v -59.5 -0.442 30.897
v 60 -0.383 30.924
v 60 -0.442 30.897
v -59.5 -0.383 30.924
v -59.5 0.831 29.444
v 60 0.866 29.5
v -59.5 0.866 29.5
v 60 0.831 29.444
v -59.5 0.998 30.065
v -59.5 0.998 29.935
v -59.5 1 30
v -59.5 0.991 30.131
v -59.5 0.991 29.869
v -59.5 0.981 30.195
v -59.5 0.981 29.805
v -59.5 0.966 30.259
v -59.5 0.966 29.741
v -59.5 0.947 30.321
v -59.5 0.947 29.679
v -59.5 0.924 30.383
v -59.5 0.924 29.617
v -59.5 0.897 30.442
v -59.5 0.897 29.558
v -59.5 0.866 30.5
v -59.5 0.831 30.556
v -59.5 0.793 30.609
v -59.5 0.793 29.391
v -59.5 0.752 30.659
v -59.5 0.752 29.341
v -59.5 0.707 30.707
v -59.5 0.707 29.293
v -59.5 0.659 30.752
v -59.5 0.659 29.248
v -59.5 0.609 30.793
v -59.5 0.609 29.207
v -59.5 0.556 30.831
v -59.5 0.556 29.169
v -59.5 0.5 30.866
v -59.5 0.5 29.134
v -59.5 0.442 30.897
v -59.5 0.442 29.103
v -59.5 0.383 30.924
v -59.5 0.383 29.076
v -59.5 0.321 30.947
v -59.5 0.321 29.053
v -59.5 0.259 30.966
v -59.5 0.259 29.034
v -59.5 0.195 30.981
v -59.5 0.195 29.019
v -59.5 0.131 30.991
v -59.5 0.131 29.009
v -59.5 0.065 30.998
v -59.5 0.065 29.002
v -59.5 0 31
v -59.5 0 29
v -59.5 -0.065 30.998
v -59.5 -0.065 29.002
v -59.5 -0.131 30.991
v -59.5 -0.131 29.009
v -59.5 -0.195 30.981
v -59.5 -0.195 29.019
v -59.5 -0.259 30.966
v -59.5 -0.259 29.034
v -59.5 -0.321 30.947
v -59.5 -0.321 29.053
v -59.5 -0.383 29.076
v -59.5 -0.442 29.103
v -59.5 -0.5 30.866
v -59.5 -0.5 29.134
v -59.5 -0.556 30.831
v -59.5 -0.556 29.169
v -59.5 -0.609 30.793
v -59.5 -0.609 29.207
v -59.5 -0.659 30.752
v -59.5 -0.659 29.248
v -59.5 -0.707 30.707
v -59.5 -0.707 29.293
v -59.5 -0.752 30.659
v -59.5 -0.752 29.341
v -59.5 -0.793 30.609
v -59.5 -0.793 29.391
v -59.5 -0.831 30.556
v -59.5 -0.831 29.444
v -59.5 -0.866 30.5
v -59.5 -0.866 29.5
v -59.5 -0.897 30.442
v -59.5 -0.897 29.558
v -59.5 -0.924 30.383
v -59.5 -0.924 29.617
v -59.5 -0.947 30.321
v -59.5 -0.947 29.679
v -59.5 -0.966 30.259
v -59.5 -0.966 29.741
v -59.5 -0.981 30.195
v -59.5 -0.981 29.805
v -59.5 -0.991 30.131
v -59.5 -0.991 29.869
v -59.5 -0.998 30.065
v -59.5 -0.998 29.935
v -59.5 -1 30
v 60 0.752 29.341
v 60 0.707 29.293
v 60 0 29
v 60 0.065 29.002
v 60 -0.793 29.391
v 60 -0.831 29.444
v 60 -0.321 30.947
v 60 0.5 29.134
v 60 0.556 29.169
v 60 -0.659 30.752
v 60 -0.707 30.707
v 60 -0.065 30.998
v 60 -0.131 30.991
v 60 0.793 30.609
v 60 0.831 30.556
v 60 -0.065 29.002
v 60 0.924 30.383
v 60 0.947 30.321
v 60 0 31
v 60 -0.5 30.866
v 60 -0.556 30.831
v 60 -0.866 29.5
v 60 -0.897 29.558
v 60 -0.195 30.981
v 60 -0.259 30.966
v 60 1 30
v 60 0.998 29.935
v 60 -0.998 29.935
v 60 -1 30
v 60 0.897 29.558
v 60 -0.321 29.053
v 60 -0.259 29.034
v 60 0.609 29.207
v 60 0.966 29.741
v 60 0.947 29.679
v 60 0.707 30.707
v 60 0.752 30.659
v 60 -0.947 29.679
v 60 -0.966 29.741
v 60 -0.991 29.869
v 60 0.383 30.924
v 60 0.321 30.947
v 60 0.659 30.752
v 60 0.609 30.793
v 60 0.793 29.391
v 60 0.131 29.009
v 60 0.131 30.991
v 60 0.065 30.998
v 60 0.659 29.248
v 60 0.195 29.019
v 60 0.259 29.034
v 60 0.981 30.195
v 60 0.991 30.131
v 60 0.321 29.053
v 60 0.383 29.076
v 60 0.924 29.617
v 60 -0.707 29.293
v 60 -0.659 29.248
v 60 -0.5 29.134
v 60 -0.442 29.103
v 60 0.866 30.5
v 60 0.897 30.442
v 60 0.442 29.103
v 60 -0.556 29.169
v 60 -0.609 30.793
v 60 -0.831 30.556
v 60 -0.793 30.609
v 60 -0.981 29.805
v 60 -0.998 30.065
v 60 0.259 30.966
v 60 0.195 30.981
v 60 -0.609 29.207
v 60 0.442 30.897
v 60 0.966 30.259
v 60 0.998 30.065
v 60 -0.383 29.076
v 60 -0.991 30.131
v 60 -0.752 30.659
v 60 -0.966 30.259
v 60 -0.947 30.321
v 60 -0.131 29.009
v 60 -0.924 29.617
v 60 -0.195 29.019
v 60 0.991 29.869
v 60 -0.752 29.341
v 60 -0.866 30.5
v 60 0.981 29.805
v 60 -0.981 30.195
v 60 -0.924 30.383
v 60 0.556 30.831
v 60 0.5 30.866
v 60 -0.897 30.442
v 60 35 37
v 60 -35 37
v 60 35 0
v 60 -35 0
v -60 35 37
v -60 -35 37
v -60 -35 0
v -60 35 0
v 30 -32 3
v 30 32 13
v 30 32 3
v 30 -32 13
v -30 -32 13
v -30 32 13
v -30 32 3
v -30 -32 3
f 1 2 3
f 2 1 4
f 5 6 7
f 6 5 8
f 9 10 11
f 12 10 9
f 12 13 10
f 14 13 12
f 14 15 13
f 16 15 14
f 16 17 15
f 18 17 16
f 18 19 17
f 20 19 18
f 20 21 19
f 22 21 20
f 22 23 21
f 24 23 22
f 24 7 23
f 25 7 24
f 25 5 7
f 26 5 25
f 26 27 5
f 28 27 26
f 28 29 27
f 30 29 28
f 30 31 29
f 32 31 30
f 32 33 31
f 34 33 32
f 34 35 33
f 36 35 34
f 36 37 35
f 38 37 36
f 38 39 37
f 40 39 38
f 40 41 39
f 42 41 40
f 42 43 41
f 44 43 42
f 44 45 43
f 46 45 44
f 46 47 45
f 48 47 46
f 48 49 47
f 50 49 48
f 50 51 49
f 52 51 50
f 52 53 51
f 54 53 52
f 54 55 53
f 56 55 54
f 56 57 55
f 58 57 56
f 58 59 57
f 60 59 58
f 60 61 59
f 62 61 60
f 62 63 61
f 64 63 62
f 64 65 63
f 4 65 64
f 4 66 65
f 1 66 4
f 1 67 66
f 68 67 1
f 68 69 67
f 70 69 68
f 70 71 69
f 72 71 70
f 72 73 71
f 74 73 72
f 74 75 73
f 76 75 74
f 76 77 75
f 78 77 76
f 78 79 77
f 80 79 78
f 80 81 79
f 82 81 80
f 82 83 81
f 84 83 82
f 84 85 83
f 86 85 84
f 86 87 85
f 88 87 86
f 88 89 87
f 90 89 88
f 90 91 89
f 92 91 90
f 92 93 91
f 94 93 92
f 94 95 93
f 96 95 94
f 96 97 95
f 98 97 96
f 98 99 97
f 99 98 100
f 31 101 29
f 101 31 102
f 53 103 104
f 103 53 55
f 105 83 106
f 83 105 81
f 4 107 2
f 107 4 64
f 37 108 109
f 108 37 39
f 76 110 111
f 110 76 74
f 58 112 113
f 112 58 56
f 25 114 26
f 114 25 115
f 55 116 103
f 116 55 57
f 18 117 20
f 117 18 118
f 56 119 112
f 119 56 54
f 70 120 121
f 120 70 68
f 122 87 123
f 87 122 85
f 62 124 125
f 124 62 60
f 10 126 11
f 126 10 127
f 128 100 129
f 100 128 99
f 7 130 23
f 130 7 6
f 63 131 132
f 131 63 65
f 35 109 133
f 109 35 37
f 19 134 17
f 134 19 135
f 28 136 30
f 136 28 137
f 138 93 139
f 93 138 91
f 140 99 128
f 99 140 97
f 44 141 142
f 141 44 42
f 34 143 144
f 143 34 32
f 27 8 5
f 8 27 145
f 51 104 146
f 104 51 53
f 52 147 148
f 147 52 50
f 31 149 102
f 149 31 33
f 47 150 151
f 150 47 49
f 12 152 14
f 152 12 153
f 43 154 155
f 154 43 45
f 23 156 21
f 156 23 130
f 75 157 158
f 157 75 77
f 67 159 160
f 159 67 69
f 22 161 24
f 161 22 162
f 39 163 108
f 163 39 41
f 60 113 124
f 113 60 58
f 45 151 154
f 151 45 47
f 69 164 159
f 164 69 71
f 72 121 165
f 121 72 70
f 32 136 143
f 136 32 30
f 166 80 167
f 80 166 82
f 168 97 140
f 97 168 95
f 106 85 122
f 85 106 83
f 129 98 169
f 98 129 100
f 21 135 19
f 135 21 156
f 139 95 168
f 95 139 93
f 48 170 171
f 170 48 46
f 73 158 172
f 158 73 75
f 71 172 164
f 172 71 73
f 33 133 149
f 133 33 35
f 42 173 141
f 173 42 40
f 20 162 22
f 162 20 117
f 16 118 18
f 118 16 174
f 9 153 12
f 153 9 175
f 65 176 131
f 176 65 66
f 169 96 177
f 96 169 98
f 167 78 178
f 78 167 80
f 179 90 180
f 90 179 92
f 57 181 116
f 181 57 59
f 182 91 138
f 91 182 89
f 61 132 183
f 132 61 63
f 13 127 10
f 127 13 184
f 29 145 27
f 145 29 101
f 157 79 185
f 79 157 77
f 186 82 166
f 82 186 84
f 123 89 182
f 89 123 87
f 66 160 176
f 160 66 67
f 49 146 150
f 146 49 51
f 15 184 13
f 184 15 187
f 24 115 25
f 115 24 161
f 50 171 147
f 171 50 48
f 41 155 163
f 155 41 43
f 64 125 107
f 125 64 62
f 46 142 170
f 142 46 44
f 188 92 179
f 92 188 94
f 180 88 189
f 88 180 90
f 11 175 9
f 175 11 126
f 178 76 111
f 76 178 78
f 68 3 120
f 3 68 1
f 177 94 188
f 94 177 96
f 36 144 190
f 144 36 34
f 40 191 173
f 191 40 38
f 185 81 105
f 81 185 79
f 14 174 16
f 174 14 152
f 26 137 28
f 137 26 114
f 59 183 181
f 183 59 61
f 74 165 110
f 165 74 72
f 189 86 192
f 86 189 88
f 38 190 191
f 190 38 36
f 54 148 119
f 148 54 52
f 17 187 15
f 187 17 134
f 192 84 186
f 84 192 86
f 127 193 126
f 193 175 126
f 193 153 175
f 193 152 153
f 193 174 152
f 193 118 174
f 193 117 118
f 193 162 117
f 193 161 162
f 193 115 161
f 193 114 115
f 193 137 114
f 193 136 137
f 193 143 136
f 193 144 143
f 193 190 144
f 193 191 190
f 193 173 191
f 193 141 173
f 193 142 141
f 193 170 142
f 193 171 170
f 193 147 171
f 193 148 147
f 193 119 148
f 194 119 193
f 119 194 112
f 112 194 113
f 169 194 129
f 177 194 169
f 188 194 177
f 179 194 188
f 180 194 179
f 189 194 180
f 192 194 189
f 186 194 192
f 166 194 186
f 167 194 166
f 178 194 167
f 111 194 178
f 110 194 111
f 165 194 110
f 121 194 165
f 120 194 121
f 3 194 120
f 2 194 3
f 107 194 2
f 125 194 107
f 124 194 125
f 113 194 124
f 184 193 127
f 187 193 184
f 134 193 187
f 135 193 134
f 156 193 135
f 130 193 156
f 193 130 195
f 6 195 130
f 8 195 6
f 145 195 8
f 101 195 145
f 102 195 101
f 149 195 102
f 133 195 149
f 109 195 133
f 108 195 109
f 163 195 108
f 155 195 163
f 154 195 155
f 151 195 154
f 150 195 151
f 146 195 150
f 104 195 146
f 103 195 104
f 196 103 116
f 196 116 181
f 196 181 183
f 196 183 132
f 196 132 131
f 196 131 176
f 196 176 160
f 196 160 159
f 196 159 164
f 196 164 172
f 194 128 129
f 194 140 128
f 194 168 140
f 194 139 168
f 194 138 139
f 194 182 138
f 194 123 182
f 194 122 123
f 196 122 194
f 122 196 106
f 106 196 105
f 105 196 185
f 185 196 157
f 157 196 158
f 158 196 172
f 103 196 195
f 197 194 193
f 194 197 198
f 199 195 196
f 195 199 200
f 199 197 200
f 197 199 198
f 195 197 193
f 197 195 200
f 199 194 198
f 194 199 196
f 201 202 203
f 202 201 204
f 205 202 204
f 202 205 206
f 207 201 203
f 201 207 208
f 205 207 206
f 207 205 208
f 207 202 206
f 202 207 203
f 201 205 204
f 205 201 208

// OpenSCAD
// Mini horizontal gel-electrophoresis buffer tank
// Print orientation: open top facing up (+Z), resting on XY plane at z = 0

// ---------- Parameters ----------
tank_x      = 120;  // outer length in X (mm)
tank_y      = 70;   // outer width in Y (mm)
tank_z      = 40;   // outer height in Z (mm)
wall        = 3;    // wall thickness (mm)
floor       = 3;    // floor thickness (mm)

platform_x  = 60;   // platform length in X (mm), centred
platform_z  = 10;   // platform height above inner floor (mm) -> top at z = 13

hole_d      = 2;    // electrode hole diameter (mm)
hole_y      = 0;    // hole centre Y (mm)
hole_z      = 30;   // hole centre Z (mm)

eps         = 0.5;  // cutter overshoot past faces (mm)
$fn         = 96;   // curve resolution

// ---------- Derived ----------
inner_w = tank_y - 2 * wall;   // inner width (Y)
// platform top is at z = floor + platform_z = 13, above which both chambers connect

// ---------- Model ----------
difference() {
    // Tank body with floor
    translate([-tank_x / 2, -tank_y / 2, 0])
        cube([tank_x, tank_y, tank_z - floor]);

    // Raised platform, full inner width, centred in X
    translate([-platform_x / 2, -inner_w / 2, floor])
        cube([platform_x, inner_w, platform_z]);

    // Horizontal electrode holes through each end wall along X
    for (sx = [-1, 1])
        translate([sx * (tank_x / 2 - eps), hole_y, hole_z])
            rotate([0, 90, 0])
                cylinder(d = hole_d, h = tank_x + 2 * eps);
}
